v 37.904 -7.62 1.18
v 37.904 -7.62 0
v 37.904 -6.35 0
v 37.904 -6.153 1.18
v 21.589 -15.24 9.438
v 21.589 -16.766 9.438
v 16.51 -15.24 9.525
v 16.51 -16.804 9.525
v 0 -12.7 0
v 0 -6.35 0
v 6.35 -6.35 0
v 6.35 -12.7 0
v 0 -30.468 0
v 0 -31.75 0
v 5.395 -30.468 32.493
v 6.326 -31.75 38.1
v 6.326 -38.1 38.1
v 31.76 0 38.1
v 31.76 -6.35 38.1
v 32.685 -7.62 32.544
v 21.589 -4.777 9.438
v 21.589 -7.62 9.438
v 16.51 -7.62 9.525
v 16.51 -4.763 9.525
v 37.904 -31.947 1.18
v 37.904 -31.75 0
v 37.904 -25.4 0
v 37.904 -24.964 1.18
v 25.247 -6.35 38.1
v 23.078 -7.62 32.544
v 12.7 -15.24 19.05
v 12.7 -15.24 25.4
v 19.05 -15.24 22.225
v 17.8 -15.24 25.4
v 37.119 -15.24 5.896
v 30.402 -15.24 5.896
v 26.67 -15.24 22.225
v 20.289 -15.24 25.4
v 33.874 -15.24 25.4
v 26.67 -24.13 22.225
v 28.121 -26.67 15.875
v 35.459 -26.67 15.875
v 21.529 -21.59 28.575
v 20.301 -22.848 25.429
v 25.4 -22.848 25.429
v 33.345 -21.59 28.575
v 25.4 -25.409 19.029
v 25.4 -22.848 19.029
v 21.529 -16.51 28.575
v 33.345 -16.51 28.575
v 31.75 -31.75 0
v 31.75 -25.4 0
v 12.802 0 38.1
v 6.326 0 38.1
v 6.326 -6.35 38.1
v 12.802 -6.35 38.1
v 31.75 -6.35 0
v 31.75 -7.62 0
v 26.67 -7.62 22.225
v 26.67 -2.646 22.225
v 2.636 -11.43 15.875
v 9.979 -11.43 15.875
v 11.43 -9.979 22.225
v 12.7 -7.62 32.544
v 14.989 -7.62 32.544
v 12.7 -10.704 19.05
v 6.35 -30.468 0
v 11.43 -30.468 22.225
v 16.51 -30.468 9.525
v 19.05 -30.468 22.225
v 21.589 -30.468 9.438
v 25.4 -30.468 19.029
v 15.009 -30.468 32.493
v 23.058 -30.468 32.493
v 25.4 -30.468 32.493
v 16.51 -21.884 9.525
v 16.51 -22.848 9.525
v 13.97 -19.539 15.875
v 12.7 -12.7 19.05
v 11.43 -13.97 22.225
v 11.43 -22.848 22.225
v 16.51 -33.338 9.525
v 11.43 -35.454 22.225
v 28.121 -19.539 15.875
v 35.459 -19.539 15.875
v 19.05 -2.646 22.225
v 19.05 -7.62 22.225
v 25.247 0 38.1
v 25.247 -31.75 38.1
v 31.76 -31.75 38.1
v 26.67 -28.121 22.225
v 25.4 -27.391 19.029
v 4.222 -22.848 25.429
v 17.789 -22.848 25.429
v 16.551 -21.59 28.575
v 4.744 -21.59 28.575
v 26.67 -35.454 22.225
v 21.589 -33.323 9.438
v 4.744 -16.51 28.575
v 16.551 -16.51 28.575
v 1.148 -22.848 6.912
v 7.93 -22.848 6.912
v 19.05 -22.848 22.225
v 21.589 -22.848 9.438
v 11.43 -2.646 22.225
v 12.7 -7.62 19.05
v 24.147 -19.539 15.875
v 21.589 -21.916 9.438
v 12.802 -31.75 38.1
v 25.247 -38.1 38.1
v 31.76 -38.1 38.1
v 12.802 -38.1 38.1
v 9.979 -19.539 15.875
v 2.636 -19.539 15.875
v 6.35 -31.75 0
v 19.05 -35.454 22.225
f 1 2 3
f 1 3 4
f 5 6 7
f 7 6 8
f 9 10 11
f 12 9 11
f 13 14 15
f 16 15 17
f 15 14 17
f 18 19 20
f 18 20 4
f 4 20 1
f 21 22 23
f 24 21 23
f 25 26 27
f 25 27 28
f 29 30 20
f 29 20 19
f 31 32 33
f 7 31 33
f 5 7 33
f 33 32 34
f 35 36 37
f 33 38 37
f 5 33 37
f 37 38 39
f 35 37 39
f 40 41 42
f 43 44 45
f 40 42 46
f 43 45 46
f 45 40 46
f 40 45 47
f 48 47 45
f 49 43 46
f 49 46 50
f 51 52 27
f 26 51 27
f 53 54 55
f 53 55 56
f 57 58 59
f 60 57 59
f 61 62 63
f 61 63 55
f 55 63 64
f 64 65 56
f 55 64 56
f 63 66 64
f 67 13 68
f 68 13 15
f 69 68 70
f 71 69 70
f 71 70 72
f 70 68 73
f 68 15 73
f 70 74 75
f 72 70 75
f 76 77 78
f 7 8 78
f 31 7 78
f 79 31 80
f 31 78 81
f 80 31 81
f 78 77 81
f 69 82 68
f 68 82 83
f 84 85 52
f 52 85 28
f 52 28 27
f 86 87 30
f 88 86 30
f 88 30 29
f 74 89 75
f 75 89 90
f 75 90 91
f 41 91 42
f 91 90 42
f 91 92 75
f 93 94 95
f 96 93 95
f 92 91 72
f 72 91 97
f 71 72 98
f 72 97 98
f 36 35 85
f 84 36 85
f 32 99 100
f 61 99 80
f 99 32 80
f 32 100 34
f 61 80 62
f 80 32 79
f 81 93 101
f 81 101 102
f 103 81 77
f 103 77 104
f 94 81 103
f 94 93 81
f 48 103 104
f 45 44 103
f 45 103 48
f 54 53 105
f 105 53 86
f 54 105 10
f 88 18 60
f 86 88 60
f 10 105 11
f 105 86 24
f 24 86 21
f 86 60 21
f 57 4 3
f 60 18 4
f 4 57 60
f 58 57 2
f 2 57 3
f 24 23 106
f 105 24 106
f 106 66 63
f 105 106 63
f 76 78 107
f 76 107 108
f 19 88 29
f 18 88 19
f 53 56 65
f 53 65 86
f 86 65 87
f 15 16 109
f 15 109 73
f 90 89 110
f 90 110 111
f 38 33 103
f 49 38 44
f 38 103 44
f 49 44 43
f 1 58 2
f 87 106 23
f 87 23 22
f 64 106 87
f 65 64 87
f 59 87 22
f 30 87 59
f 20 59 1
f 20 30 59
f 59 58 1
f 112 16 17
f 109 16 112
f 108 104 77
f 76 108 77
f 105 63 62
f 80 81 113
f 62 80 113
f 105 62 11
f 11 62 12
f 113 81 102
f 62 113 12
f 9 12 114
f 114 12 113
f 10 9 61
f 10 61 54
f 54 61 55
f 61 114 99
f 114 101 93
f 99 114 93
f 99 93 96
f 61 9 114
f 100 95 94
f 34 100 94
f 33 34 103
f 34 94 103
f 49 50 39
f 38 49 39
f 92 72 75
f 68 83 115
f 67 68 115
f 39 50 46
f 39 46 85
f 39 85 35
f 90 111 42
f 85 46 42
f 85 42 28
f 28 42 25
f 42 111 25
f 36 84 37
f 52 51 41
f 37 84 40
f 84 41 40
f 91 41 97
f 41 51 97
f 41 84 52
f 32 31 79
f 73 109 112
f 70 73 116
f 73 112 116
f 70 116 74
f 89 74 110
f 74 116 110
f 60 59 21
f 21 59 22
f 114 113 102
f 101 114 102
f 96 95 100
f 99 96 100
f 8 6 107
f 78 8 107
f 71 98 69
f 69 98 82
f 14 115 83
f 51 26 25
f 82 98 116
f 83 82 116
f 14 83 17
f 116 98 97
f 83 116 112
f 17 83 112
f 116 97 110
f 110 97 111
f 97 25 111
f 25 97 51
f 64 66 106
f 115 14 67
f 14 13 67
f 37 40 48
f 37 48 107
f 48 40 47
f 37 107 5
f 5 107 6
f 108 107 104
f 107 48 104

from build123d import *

# Parameters (mm, degrees)
F0_W      = 37.9036115915
F0_H      = 38.1
F1_DEPTH  = 38.1
F6_DEPTH  = 38.1
F8_DEPTH  = 38.1
F9_W      = 25.4
F9_H      = 7.62
F10_DEPTH = 38.1


# Not quite as in the source:
# - a feature names something its author has since deleted; it is built from what else it names


with BuildPart() as f1:
    # F0 (on Front) → F1 (new body)
    with BuildSketch(Plane.XZ):
        with Locations((18.9518057957, 19.05)):
            Rectangle(F0_W, F0_H)
    extrude(amount=F1_DEPTH)

    # F5 (on offset) → F6 (cut)
    with BuildSketch(Plane.YZ.offset(38.1)):
        Polygon((-6.35, 38.1), (-31.75, 38.1), (-26.67, 15.875), (-21.59, 28.575), (-16.51, 28.575), (-11.43, 15.875), align=None)
        Polygon((-31.75, 0), (-38.1, 38.1), (-38.1, 0), align=None)
        Polygon((-19.5393956542, 15.875), (-25.4, 0), (-12.7, 0), align=None)
        Polygon((0, 0), (0, 38.1), (-6.35, 0), align=None)
    extrude(amount=-F6_DEPTH, mode=Mode.SUBTRACT)

    # F7 (on offset) → F8 (cut)
    with BuildSketch(Plane.XZ.offset(38.1)):
        Polygon((25.2844232855, 38.196389037), (12.7511301009, 38.2289945719), (19.05, 22.225), align=None)
        Polygon((11.43, 22.225), (6.35, 0), (31.75, 0), (26.67, 22.225), (21.589256481, 9.4380885469), (16.51, 9.525), align=None)
        Polygon((38.1, 38.1630491376), (31.7472500896, 38.179575904), (31.75, 38.1630491376), (38.1, 0), align=None)
        Polygon((6.35, 38.2456472001), (0, 38.2621668126), (0, 0), align=None)
    extrude(amount=-F8_DEPTH, mode=Mode.SUBTRACT)

    # F9 (on offset) → F10 (cut)
    with BuildSketch(Plane.XY.offset(38.1)):
        with Locations((25.4, -11.43)):
            Rectangle(F9_W, F9_H)
        with Locations((12.7, -26.6583908668)):
            Rectangle(F9_W, F9_H)
    extrude(amount=-F10_DEPTH, mode=Mode.SUBTRACT)


solid = f1.part
